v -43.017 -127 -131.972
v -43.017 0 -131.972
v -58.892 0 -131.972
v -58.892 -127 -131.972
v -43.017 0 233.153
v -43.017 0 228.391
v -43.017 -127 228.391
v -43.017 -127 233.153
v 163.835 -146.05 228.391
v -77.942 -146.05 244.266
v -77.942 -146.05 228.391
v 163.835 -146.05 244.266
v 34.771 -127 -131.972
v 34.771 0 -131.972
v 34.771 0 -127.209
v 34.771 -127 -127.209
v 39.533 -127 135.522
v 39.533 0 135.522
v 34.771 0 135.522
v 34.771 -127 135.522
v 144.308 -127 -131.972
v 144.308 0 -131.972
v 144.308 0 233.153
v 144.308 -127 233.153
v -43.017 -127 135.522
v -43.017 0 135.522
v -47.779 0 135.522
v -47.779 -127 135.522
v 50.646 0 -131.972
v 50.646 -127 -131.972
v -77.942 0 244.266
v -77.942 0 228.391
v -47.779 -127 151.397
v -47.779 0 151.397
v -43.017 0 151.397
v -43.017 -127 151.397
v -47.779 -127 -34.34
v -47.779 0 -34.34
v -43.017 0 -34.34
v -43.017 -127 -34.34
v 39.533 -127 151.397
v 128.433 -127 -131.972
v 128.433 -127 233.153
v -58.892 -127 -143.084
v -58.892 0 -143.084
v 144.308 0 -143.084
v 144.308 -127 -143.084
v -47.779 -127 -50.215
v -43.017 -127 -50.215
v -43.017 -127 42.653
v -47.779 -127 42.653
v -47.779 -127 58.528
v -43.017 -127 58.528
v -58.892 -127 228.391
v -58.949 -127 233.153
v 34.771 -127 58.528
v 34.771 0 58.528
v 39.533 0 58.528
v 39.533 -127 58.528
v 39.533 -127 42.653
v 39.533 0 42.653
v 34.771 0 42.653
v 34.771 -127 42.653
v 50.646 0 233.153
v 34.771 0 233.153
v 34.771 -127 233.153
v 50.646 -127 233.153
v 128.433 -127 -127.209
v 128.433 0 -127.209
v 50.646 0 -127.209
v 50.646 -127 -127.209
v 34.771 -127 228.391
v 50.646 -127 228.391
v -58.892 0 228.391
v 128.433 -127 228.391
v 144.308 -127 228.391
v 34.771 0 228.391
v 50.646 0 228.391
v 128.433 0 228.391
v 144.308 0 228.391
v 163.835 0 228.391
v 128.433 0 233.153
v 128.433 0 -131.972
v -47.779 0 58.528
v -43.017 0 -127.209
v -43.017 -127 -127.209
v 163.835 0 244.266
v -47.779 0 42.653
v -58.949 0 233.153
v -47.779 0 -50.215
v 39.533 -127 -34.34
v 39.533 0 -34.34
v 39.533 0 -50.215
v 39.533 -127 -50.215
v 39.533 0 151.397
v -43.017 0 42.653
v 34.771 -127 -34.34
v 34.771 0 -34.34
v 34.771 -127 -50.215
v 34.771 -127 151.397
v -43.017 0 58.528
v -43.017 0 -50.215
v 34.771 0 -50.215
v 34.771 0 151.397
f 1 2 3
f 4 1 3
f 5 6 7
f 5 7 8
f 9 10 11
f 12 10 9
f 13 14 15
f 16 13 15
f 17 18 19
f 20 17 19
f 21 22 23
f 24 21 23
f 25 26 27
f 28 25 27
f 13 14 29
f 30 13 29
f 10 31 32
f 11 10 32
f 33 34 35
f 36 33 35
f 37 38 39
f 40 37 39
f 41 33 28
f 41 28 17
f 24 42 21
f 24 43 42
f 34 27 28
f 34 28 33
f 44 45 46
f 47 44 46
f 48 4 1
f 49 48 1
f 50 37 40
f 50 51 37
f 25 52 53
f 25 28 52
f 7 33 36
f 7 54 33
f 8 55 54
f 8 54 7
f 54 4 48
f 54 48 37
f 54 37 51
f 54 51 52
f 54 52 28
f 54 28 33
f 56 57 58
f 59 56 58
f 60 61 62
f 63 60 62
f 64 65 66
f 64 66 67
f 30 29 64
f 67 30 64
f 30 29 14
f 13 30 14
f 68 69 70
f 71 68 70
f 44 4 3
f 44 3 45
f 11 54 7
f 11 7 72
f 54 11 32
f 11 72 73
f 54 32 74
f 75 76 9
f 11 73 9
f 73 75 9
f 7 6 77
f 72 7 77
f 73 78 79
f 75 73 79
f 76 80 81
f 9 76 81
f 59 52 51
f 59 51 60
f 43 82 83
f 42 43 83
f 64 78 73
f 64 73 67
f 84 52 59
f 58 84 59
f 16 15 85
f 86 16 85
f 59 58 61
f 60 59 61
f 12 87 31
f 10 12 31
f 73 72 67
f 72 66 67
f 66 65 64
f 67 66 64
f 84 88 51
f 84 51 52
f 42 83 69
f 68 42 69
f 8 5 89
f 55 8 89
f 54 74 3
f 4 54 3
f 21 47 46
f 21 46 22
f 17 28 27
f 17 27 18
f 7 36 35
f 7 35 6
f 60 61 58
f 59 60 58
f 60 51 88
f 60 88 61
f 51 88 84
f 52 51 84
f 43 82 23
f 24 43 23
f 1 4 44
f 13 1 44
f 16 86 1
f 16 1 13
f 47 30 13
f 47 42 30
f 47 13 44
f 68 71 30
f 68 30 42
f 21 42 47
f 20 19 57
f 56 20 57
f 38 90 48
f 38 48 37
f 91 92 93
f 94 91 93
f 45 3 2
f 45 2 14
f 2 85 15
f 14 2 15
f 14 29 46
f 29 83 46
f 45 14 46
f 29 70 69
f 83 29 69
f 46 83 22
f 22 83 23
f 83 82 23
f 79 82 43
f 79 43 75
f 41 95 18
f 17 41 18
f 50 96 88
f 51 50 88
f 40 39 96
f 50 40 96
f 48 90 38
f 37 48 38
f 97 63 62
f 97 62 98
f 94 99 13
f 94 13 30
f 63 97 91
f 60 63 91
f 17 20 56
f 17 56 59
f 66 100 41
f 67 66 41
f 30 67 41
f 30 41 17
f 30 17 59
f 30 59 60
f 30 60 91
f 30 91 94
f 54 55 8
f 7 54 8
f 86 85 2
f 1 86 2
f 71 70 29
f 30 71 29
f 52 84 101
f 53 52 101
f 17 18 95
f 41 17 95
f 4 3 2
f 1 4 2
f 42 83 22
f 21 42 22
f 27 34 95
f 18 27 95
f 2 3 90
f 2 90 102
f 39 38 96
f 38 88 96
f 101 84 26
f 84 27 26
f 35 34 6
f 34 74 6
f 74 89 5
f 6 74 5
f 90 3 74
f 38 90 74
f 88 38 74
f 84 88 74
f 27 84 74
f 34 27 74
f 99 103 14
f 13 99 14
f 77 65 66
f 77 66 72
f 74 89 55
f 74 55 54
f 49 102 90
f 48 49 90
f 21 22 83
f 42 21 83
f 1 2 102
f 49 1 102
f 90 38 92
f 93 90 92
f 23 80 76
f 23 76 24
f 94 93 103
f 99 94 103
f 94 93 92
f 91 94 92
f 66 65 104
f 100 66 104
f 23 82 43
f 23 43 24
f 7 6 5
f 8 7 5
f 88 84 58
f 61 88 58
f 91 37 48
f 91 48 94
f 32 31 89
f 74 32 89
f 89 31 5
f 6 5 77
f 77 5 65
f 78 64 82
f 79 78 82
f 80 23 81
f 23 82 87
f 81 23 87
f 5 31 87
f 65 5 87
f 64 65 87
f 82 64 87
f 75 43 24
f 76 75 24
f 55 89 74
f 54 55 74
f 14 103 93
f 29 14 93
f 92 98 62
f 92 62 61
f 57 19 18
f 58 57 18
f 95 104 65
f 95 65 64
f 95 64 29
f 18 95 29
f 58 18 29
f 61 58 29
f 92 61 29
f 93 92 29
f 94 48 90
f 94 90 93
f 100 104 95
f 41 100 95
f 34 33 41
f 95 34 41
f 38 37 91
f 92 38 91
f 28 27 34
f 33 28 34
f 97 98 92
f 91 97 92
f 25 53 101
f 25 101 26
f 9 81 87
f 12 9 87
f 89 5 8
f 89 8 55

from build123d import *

# Parameters (mm, degrees)
F0_W     = 15.875
F0_H     = 4.7625
F1_DEPTH = 127
F2_DEPTH = 127
F3_W     = 87.3125
F3_H     = 15.875
F4_DEPTH = 127
F6_DEPTH = 146.05


with BuildPart() as f1:
    # F0 (on Front) → F1 (new body)
    with BuildSketch(Plane.XZ):
        Polygon((-43.016921, 228.390501), (-58.891921, 228.390846), (-58.891921, -127.209154), (-58.891921, -131.971654), (-43.016921, -131.971654), (-43.016921, -127.209154), (-43.016921, -50.21549), (-47.779421, -50.21549), (-47.779421, -34.34049), (-43.016921, -34.34049), (-43.016921, 42.653173), (-47.779421, 42.653173), (-47.779421, 58.528173), (-43.016921, 58.528173), (-43.016921, 135.521837), (-47.779421, 135.521837), (-47.779421, 151.396837), (-43.016921, 151.396837), align=None)
        Polygon((34.770579, -50.215491), (34.770579, -127.209154), (34.770579, -131.971654), (50.645579, -131.971654), (50.645579, -127.209154), (50.645579, 228.390501), (34.770579, 228.390501), (34.770579, 151.396837), (39.533079, 151.396837), (39.533079, 135.521837), (34.770579, 135.521837), (34.770579, 58.528173), (39.533079, 58.528173), (39.533079, 42.653173), (34.770579, 42.653173), (34.770579, -34.340491), (39.533079, -34.340491), (39.533079, -50.215491), align=None)
        Polygon((128.433079, -131.971654), (144.308079, -131.971654), (144.308079, -127.209154), (144.308079, 228.390501), (128.433079, 228.390501), (128.433079, -127.209154), align=None)
        Polygon((-58.949242, 233.153001), (-58.891921, 228.390846), (-43.016921, 228.390501), (-43.016817, 233.153001), align=None)
        with Locations((42.708079, 230.771751)):
            Rectangle(F0_W, F0_H)
        with Locations((136.370579, 230.771751)):
            Rectangle(F0_W, F0_H)
    extrude(amount=F1_DEPTH)


with BuildPart() as f2:
    # F0 (on Front) → F2 (new body)
    with BuildSketch(Plane.XZ):
        Polygon((-43.016921, -131.971654), (-58.891921, -131.971654), (-58.891921, -143.084154), (144.308079, -143.084154), (144.308079, -131.971654), (128.433079, -131.971654), (128.433079, -127.209154), (50.645579, -127.209154), (50.645579, -131.971654), (34.770579, -131.971654), (34.770579, -127.209154), (-43.016921, -127.209154), align=None)
    extrude(amount=F2_DEPTH)


with BuildPart() as f4:
    # F3 (on Front) → F4 (new body)
    with BuildSketch(Plane.XZ):
        with Locations((-4.123171, 143.459337)):
            Rectangle(F3_W, F3_H)
        with Locations((-4.123171, 50.590673)):
            Rectangle(F3_W, F3_H)
        with Locations((-4.123171, -42.27799)):
            Rectangle(F3_W, F3_H)
    extrude(amount=F4_DEPTH)


with BuildPart() as f6:
    # F5 (on face) → F6 (new body)
    with BuildSketch(Plane.XZ):
        Polygon((-58.891921, 228.390846), (144.785458, 228.390846), (163.835458, 228.390846), (163.835458, 244.265846), (-77.941921, 244.265846), (-77.941921, 228.390846), align=None)
    extrude(amount=F6_DEPTH)

    # F7: cut F1
    add(f1.part, mode=Mode.SUBTRACT)


solid = Compound([f1.part, f2.part, f4.part, f6.part])
